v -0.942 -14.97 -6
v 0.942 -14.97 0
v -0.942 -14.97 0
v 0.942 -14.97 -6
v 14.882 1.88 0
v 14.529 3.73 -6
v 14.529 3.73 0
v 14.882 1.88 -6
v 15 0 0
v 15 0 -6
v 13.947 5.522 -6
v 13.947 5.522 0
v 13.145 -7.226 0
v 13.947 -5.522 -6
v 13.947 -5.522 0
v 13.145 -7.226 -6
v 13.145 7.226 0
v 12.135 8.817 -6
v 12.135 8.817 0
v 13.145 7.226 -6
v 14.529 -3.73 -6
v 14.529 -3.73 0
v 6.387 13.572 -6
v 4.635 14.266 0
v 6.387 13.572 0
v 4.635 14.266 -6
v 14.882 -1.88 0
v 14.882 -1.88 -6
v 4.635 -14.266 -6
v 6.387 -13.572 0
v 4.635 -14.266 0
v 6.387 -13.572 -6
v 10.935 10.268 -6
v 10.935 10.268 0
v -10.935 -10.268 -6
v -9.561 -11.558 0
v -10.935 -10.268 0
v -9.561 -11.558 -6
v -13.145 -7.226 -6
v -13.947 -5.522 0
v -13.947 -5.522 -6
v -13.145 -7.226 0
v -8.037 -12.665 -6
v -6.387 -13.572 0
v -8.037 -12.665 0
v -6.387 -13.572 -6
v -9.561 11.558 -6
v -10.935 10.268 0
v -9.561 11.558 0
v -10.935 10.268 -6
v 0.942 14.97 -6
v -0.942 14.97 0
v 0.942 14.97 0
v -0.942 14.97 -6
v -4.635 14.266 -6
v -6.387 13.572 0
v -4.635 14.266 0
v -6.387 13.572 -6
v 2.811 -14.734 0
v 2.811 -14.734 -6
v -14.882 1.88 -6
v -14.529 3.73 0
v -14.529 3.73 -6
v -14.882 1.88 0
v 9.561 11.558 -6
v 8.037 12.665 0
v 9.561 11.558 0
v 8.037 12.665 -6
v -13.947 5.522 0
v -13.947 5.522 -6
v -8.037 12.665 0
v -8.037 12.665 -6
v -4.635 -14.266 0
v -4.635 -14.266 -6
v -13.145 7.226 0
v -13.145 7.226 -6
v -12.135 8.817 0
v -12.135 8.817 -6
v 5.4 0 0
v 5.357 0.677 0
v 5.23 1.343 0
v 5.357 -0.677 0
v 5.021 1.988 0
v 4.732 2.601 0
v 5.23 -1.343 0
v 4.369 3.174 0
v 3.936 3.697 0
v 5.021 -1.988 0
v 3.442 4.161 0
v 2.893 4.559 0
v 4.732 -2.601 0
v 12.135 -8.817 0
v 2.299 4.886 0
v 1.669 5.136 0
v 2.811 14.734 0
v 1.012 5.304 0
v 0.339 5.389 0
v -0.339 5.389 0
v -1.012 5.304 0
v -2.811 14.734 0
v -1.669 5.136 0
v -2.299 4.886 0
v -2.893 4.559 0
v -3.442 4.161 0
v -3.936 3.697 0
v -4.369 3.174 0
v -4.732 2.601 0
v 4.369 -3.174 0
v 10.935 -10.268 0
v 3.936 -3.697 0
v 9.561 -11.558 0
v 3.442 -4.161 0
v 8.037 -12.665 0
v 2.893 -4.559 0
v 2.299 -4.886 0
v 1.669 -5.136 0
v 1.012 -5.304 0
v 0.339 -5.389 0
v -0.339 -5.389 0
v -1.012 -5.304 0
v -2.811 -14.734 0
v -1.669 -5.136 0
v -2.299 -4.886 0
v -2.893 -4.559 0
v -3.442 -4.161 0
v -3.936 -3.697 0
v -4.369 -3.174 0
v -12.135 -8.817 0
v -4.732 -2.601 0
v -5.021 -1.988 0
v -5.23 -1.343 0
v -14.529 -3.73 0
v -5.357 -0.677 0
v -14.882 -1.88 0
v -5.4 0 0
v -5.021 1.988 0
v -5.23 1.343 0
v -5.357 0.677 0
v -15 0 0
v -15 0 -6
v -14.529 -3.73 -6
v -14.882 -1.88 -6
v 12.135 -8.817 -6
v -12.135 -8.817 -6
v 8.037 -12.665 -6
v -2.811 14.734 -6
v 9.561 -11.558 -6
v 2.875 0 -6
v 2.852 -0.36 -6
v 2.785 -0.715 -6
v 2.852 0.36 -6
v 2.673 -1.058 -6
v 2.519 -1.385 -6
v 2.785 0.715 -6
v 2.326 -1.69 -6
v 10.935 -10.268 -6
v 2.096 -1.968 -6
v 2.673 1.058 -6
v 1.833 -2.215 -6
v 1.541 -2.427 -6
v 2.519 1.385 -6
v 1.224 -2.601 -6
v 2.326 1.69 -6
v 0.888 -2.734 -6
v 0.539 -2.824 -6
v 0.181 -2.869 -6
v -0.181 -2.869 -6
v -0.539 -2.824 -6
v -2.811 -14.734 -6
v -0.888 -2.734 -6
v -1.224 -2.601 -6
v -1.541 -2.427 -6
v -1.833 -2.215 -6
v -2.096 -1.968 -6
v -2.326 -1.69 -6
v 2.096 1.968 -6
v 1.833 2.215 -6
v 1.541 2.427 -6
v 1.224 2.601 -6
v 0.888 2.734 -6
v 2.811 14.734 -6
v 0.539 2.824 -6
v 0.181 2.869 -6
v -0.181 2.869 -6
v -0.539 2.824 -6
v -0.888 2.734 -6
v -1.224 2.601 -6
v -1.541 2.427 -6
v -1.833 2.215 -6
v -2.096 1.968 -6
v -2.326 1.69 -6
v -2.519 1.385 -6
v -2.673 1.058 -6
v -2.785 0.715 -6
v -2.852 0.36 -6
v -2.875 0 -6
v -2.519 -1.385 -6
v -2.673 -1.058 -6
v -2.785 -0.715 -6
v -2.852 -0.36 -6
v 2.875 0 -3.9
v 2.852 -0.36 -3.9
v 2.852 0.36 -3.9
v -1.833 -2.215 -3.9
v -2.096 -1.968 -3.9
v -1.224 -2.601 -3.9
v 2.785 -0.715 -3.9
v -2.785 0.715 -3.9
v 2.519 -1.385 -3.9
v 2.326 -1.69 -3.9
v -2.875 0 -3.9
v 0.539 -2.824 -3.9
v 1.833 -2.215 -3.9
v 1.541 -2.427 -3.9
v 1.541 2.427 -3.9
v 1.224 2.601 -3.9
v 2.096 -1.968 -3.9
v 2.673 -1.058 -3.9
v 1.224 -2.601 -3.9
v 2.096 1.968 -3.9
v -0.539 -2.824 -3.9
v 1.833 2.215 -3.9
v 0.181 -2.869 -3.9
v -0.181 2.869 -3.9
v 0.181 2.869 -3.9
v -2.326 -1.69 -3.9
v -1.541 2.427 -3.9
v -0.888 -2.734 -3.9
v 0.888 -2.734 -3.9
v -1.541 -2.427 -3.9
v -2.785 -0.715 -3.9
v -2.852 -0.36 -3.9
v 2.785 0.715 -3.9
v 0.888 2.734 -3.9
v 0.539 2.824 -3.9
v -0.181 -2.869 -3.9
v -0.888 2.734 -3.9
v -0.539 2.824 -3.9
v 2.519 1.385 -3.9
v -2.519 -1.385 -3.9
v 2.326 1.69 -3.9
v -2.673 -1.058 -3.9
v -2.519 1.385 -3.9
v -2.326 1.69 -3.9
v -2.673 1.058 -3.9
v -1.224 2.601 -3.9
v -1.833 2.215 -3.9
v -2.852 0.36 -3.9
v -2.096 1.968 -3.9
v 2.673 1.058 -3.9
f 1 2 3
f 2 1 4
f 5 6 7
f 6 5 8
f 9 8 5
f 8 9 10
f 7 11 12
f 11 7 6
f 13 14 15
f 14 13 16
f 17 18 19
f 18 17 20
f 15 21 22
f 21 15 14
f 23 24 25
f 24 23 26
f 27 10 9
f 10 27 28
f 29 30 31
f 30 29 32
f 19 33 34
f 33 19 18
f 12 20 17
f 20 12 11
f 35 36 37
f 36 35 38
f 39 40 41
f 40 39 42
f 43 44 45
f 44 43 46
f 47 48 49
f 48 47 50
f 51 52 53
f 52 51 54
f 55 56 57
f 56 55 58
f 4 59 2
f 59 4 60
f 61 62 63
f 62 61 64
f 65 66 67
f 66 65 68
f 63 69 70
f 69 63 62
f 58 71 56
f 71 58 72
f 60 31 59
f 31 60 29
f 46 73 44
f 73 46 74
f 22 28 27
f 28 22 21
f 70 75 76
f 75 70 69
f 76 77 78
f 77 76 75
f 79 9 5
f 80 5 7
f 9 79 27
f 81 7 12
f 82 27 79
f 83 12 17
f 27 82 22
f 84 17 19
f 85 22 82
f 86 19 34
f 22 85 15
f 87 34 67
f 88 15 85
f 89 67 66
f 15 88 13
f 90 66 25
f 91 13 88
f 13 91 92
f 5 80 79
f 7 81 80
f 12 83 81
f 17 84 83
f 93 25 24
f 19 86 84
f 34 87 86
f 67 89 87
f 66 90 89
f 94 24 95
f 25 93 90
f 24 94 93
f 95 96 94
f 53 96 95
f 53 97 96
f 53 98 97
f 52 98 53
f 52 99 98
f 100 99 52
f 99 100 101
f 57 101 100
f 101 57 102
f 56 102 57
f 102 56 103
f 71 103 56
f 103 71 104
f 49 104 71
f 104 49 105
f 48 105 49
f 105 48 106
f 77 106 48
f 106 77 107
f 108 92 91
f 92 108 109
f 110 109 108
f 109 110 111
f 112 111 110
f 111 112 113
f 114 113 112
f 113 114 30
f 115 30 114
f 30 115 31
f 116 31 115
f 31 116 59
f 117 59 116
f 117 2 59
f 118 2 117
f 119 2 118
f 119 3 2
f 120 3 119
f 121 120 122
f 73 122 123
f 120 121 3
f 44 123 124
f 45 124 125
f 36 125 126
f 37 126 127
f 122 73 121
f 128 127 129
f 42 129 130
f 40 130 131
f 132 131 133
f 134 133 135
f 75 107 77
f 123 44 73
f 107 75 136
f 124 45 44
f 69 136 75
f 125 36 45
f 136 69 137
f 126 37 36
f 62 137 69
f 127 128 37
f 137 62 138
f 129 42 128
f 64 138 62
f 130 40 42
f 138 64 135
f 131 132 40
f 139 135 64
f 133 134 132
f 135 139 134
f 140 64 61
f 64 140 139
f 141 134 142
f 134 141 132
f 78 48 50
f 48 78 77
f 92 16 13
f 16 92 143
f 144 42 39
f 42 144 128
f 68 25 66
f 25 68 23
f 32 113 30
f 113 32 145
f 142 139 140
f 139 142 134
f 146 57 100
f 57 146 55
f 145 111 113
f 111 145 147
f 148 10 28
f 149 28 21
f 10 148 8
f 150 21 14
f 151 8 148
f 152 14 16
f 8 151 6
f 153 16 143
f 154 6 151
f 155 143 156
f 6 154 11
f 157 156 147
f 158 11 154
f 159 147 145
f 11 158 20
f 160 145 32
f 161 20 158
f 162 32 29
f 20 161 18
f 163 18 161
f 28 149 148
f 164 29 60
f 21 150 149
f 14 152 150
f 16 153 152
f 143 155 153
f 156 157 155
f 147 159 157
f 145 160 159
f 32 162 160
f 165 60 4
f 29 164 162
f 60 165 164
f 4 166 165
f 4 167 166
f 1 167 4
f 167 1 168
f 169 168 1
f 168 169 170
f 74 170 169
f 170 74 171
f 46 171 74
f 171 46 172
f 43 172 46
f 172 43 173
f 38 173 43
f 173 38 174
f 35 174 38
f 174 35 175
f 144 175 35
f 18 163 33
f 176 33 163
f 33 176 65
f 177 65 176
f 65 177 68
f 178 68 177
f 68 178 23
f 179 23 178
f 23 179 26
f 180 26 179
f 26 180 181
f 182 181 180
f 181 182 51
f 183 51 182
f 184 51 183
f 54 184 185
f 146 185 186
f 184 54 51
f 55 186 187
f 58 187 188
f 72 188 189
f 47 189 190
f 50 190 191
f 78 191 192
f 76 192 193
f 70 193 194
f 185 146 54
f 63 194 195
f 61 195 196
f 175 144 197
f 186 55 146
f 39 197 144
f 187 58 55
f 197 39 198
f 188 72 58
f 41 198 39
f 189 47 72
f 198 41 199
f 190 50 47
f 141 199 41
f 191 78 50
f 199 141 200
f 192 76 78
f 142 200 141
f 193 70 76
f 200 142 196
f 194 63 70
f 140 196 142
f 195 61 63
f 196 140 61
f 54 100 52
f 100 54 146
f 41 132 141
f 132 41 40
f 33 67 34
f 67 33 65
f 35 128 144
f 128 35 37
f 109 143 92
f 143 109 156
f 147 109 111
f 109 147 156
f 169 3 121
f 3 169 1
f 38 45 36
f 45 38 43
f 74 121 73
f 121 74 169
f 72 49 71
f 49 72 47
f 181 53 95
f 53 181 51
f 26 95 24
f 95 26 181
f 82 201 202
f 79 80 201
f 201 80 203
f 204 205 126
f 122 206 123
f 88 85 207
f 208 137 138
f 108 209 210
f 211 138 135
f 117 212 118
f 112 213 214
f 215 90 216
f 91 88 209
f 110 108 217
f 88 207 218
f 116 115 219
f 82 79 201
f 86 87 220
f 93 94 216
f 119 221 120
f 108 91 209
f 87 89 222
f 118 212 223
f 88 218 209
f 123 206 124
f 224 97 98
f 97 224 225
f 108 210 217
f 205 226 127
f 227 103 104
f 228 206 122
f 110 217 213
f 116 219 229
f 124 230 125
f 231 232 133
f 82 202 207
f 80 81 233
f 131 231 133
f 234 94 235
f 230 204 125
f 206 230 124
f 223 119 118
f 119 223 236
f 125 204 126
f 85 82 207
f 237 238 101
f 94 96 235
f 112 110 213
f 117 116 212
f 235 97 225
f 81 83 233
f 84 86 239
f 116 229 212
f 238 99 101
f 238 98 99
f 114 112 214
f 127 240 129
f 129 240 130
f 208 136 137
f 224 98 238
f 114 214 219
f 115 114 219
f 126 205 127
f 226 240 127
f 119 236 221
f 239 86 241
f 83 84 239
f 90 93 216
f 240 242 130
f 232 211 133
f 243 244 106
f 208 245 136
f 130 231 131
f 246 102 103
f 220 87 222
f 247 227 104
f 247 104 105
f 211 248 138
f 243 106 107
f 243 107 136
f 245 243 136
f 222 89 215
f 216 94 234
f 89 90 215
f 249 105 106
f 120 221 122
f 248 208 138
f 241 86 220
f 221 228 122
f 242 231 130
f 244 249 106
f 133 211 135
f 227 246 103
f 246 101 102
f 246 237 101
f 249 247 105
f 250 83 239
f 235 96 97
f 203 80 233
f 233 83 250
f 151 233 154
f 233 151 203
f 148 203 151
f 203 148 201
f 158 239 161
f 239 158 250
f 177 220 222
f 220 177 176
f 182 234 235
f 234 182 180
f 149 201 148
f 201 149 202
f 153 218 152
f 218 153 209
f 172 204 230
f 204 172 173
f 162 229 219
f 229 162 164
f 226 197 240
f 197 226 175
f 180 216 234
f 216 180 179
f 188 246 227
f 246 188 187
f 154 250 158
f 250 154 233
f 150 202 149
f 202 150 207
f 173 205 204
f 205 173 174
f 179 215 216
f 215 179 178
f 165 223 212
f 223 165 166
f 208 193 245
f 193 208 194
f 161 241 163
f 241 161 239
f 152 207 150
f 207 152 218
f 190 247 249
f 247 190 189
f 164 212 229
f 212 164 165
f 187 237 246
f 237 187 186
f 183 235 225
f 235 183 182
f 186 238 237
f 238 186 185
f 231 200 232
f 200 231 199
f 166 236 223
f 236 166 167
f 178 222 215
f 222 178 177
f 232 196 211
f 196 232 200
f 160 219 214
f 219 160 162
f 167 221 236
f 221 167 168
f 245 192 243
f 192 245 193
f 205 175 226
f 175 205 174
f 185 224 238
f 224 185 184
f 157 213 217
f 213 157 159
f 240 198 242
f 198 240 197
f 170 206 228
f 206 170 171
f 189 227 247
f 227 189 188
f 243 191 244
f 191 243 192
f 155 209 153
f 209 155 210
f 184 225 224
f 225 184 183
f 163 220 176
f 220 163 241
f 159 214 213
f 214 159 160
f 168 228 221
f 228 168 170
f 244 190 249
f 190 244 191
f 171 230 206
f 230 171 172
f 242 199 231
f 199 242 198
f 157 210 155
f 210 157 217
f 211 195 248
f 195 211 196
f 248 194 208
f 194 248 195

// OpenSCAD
$fn = 50;


difference() {
	union() {
		translate(v = [0, 0, -6.0000000000]) {
			cylinder(h = 6, r = 15.0000000000);
		}
		translate(v = [0, 0, -6.0000000000]) {
			cylinder(h = 6, r = 2.8750000000);
		}
	}
	union() {
		translate(v = [0, 0, 0]) {
			rotate(a = [0, 0, 0]) {
				difference() {
					union() {
						translate(v = [0, 0, -6.0000000000]) {
							cylinder(h = 6, r = 2.6000000000);
						}
						translate(v = [0, 0, -3.9000000000]) {
							cylinder(h = 3.9000000000, r1 = 2.8750000000, r2 = 5.4000000000);
						}
						translate(v = [0, 0, -6.0000000000]) {
							cylinder(h = 6, r = 2.8750000000);
						}
						translate(v = [0, 0, -6.0000000000]) {
							cylinder(h = 6, r = 2.6000000000);
						}
					}
					union();
				}
			}
		}
	}
}
